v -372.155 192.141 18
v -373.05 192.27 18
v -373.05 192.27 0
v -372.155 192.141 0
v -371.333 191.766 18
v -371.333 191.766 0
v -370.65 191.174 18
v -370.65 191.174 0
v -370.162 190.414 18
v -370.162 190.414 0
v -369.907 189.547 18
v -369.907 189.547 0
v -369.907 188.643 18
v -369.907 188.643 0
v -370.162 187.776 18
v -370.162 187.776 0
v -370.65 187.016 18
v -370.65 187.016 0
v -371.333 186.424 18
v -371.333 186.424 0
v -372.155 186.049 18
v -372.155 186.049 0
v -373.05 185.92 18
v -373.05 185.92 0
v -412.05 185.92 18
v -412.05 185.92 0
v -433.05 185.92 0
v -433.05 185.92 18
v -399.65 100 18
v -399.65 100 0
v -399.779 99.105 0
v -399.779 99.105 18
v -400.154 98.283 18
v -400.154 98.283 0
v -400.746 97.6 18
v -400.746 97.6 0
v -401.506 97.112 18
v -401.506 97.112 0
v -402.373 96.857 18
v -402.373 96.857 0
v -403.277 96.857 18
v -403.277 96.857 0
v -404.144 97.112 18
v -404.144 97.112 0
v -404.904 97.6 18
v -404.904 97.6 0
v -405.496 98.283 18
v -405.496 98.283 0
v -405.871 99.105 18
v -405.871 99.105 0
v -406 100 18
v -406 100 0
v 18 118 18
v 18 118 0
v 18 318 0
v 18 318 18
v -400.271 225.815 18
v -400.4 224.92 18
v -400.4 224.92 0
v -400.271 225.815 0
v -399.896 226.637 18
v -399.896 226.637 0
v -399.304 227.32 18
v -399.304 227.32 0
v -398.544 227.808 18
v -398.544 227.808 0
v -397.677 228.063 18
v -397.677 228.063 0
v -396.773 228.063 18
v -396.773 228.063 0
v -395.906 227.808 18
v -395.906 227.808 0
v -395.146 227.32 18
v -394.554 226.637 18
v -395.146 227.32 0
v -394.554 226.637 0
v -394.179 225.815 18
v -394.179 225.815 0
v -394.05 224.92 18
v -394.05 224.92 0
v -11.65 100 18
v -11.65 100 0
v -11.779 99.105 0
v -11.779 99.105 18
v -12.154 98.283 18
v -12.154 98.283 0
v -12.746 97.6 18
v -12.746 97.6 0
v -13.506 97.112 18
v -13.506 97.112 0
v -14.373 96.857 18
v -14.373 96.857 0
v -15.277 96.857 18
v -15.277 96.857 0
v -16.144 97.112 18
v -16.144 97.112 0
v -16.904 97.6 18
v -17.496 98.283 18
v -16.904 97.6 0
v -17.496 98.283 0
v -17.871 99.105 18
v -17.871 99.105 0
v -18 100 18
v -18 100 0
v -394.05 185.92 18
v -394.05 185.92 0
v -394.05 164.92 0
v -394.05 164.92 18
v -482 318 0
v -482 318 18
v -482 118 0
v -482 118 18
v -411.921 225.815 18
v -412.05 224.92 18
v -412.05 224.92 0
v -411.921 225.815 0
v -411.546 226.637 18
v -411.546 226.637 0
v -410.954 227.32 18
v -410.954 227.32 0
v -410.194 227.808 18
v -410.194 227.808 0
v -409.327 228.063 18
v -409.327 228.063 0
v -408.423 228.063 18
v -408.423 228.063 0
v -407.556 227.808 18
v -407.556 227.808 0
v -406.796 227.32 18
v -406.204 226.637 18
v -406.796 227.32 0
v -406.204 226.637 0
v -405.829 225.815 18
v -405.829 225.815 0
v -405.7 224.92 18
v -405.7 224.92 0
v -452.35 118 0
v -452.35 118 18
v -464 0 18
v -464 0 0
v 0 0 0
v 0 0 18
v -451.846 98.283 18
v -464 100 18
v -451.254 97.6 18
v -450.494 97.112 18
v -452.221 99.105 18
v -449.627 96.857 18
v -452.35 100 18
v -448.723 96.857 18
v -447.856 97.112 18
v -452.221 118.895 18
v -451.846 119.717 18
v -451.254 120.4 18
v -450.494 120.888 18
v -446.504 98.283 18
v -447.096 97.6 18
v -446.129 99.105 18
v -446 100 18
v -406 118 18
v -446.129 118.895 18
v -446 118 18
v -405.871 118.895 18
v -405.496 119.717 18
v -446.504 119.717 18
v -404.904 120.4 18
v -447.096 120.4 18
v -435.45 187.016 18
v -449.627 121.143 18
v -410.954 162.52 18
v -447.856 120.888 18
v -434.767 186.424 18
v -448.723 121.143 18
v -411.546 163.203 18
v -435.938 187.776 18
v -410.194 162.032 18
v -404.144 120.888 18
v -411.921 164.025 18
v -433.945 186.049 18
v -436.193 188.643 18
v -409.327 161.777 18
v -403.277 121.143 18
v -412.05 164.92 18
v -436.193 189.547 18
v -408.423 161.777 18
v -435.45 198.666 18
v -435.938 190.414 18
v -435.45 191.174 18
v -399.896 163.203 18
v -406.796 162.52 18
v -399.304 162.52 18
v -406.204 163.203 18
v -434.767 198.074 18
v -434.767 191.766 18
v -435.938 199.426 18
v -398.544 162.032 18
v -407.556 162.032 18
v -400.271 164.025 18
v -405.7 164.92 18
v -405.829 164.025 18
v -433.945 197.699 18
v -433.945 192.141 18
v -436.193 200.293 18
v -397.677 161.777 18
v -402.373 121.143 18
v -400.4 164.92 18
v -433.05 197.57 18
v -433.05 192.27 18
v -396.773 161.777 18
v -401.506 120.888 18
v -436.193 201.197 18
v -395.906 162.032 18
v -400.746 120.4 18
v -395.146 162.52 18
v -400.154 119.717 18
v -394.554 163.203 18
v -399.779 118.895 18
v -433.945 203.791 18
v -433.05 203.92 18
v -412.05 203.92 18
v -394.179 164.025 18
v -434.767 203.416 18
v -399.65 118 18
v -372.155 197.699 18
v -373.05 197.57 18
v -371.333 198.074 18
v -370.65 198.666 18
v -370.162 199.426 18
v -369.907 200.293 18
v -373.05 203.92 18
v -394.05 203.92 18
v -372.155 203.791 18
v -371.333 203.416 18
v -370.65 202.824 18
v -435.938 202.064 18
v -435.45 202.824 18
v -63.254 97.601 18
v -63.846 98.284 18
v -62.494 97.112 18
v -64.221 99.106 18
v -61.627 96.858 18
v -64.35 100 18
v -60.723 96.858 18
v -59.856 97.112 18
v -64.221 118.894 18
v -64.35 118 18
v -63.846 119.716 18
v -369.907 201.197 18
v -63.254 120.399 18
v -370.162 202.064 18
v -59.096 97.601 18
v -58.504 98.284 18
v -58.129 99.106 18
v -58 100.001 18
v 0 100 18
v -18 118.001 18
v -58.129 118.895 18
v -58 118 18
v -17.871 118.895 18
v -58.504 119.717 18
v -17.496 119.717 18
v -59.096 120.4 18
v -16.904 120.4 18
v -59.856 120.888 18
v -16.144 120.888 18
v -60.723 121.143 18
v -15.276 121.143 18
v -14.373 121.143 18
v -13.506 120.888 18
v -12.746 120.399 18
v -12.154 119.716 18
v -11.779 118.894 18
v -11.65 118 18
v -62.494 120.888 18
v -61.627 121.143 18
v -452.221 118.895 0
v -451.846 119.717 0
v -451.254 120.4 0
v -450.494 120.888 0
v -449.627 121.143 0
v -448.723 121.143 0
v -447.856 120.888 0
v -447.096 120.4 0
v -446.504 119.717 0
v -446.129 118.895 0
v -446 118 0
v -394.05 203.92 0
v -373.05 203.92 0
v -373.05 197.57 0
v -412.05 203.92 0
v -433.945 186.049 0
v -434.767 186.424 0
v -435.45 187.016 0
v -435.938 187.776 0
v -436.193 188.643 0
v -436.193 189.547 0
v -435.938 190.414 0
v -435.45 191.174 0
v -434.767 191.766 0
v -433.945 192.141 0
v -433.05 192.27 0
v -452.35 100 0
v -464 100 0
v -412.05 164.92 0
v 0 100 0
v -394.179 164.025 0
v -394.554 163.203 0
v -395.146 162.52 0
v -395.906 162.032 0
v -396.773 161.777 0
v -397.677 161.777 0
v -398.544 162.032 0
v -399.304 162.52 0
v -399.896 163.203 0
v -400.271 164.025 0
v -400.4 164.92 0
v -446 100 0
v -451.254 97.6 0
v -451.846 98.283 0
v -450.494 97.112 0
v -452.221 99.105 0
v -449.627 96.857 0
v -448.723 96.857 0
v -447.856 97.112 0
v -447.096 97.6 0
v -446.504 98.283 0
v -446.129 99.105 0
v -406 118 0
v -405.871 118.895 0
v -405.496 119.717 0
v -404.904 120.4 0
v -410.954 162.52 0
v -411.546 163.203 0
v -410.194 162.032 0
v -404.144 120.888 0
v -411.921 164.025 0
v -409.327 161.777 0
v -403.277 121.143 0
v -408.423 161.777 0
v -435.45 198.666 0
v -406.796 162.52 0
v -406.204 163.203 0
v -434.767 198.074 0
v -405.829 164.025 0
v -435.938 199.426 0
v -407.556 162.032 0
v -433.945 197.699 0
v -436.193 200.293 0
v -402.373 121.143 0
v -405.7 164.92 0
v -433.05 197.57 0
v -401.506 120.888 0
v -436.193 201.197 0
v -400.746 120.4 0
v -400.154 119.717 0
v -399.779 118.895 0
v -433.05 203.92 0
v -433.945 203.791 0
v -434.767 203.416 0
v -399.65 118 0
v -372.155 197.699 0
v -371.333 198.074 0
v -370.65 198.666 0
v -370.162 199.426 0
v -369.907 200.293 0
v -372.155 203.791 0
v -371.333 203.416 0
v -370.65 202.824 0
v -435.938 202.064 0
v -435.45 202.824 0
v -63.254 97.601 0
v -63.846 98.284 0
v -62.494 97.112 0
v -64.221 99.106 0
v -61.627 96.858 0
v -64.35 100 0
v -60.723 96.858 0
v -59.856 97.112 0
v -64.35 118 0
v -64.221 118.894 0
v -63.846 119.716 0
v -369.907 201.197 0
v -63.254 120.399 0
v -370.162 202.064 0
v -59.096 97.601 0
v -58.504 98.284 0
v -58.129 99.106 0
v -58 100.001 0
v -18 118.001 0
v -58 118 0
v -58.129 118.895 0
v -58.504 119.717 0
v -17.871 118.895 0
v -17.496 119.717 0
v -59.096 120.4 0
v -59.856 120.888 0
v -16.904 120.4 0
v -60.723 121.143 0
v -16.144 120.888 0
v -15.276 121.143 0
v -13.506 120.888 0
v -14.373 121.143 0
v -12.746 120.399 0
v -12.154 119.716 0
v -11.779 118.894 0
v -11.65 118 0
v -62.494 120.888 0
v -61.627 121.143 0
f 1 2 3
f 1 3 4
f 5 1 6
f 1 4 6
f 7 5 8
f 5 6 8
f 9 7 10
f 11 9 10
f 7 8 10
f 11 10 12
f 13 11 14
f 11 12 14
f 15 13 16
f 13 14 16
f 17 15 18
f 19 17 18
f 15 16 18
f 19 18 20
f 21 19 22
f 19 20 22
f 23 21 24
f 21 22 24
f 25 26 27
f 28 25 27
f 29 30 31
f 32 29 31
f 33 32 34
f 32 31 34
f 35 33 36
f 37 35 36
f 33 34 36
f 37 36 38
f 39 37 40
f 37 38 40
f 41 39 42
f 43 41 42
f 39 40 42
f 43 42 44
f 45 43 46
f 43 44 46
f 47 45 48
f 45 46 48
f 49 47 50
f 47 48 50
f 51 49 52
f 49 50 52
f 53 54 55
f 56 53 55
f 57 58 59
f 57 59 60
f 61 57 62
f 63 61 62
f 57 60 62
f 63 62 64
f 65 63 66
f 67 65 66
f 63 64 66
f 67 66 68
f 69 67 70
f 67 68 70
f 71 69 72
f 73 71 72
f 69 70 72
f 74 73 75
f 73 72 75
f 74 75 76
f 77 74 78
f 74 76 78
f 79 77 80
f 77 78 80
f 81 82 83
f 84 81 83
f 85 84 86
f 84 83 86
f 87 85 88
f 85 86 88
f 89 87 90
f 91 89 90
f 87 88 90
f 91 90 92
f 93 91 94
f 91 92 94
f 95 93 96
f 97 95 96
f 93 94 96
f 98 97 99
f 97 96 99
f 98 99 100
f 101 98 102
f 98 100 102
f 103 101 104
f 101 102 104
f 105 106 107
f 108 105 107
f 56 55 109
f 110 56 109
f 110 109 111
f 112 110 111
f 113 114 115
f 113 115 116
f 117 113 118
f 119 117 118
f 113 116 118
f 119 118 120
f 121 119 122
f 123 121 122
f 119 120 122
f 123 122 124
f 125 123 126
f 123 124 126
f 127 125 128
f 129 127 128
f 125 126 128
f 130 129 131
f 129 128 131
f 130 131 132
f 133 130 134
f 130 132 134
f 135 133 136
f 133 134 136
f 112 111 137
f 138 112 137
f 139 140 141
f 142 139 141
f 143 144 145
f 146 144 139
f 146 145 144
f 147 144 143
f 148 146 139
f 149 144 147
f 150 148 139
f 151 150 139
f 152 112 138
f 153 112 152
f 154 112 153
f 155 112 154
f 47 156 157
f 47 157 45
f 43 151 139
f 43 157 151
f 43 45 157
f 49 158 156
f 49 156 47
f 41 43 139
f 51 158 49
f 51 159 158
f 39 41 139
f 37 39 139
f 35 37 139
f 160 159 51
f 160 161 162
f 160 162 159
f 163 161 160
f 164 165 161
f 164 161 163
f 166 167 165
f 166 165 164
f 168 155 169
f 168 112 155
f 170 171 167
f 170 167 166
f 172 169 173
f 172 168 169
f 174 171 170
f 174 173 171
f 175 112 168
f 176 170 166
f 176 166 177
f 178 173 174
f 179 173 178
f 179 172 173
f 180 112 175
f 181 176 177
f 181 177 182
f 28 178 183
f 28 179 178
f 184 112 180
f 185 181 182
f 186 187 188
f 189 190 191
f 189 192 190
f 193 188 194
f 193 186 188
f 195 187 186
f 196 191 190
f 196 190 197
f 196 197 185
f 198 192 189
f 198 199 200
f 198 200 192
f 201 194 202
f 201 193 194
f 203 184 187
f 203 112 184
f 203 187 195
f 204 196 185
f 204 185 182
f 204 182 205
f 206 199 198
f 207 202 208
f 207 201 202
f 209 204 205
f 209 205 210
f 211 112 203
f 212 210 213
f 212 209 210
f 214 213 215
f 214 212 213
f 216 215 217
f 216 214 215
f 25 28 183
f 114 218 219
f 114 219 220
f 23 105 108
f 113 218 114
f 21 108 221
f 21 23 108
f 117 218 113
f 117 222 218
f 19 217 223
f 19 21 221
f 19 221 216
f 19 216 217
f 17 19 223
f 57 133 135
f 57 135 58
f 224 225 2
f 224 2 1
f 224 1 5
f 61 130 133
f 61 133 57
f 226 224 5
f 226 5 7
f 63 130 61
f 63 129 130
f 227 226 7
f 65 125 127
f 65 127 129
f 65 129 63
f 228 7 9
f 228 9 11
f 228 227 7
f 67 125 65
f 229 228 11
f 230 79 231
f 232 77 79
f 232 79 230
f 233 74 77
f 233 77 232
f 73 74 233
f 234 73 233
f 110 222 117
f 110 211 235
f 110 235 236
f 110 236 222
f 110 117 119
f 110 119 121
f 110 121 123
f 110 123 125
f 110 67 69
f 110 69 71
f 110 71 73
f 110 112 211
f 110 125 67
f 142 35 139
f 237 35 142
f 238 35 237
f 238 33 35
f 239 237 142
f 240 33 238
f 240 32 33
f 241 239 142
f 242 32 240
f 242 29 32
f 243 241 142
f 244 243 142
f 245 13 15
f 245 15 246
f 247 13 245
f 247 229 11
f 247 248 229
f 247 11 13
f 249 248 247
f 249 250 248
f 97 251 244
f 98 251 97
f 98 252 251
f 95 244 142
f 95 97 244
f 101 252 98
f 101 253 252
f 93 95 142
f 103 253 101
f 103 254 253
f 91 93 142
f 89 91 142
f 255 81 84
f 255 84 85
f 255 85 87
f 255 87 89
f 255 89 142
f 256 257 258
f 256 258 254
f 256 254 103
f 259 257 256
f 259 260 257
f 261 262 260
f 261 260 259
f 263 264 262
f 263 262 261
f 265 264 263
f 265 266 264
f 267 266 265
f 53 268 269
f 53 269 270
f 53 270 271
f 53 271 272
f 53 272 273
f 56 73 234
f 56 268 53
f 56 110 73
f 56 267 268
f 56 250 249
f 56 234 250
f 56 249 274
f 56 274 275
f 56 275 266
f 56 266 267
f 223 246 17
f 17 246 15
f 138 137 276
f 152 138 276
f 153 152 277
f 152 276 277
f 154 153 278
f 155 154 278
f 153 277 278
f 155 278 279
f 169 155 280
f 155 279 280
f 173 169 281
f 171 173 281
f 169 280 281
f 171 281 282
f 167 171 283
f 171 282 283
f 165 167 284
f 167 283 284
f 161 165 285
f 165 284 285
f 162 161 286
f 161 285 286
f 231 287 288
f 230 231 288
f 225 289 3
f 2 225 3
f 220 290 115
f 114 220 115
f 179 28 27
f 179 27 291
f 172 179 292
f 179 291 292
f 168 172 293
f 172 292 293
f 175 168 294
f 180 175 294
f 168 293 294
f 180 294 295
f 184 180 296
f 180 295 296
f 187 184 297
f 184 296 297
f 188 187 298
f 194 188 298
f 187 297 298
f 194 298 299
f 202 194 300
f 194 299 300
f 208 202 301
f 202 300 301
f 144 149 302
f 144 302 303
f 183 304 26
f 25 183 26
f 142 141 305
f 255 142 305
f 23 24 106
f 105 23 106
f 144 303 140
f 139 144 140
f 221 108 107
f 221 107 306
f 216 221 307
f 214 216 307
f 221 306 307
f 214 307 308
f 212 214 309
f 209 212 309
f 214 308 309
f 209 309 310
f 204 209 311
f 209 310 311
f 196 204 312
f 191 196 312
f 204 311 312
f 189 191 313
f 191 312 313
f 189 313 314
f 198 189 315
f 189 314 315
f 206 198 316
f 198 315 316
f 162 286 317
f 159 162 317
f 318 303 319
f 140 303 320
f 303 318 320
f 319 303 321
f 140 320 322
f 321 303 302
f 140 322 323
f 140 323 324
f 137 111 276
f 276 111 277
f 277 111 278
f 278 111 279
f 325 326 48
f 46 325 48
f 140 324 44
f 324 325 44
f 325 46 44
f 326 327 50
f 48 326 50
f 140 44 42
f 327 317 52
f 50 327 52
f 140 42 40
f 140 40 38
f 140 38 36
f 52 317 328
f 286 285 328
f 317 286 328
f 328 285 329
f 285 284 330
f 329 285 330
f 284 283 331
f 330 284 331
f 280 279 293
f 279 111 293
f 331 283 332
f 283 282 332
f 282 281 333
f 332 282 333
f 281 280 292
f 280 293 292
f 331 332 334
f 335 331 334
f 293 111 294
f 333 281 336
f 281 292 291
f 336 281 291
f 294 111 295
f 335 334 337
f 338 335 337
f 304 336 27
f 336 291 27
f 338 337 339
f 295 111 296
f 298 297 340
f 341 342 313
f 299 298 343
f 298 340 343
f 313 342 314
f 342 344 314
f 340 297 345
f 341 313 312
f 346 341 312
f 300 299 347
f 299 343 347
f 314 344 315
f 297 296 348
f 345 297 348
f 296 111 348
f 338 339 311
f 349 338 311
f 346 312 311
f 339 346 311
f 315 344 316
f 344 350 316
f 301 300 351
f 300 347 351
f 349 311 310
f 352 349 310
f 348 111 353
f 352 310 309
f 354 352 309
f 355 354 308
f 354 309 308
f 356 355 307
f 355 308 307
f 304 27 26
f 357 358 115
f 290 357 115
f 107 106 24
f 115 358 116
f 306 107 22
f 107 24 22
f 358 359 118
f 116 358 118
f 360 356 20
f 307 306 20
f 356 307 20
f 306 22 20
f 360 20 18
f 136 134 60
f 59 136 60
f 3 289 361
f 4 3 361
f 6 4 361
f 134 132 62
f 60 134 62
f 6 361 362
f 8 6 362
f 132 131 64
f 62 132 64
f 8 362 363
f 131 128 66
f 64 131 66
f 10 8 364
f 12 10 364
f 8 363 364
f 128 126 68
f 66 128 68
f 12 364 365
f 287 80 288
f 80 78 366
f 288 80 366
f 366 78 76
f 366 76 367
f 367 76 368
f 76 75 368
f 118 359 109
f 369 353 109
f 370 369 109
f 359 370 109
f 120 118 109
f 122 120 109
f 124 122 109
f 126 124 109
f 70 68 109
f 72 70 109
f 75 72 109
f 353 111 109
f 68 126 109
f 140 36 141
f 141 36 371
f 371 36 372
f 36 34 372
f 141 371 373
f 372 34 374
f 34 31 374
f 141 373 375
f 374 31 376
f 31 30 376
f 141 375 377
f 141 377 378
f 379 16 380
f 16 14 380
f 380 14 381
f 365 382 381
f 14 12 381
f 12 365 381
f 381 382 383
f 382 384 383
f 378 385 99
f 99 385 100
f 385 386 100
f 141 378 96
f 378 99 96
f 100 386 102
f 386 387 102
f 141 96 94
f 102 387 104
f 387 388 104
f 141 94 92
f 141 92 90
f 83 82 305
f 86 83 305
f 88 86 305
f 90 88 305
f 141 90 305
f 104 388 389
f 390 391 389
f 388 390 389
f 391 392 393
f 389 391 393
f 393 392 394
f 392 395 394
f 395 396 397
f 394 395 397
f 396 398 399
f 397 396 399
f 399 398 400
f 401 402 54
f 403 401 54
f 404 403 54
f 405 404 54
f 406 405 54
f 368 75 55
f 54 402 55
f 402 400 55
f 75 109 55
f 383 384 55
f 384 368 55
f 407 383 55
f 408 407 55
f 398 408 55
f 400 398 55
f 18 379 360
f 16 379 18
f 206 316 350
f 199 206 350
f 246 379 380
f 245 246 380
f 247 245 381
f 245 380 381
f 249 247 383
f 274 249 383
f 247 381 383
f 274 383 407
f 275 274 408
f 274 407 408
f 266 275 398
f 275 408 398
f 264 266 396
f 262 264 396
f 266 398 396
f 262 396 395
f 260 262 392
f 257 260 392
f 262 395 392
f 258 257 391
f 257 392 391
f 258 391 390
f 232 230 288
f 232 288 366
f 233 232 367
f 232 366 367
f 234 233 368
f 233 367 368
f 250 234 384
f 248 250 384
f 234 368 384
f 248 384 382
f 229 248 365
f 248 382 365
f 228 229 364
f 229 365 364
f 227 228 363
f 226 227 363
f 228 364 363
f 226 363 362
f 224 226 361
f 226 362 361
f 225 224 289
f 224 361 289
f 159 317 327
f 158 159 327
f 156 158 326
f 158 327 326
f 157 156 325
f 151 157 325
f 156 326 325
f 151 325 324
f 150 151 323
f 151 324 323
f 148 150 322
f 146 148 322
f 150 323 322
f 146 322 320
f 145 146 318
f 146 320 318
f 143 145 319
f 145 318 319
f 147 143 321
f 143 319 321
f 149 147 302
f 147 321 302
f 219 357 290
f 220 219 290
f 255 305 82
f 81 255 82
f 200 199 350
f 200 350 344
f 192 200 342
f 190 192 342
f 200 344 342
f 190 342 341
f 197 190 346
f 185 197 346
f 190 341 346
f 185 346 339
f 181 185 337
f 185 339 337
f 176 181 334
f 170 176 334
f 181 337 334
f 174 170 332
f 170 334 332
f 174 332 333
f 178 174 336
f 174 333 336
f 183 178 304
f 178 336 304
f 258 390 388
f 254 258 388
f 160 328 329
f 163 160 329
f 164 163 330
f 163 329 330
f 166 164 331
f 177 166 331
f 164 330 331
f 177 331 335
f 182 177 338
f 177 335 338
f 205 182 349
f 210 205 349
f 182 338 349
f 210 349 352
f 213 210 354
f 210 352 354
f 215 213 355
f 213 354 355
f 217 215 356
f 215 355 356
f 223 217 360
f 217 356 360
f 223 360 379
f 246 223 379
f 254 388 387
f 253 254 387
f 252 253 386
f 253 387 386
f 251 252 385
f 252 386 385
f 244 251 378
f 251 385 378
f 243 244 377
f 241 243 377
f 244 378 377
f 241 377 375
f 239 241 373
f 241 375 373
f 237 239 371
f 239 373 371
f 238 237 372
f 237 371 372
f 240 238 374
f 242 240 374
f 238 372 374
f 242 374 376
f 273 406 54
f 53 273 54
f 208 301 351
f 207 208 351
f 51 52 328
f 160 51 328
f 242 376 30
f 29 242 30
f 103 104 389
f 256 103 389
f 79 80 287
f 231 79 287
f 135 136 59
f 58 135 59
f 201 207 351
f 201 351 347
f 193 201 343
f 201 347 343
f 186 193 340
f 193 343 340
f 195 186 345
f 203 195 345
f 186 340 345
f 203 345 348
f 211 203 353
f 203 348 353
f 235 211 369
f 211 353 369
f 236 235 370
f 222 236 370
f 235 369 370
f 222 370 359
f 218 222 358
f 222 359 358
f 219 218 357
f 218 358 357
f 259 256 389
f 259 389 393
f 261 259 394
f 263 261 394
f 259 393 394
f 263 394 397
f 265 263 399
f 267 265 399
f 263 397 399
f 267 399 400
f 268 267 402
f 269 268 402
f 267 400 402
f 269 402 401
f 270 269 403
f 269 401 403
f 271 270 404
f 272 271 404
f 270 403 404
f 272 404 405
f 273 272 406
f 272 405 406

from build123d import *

# Parameters (mm, degrees)
ESTRUSIONE_ESTRUSIONE1_DEPTH = 18
TAGLIO_ESTRUSIONE3_DEPTH     = 61
TAGLIO_ESTRUSIONE5_DEPTH     = 100


with BuildPart() as part:
    # Schizzo1 → Estrusione-Estrusione1 (new body)
    with BuildSketch(Plane.XY):
        with BuildLine():
            Line((-452.35, 100), (-464, 100))
            Line((-464, 100), (-464, 0))
            Line((-464, 0), (0, 0))
            Line((0, 0), (0, 100))
            Line((0, 100), (-11.650000002, 100))
            ThreePointArc((-11.650000002, 100), (-14.825000002, 96.825), (-18.000000001, 100))
            Line((-18.000000001, 100), (-18.000000001, 118.000682307))
            ThreePointArc((-18.000000001, 118.000682307), (-14.824658921, 121.174999982), (-11.650000075, 118))
            Line((-11.650000075, 118), (18, 118))
            Line((18, 118), (18, 318))
            Line((18, 318), (-482, 318))
            Line((-482, 318), (-482, 118))
            Line((-482, 118), (-452.35, 118))
            ThreePointArc((-452.35, 118), (-449.175, 121.175), (-446, 118))
            Line((-446, 118), (-446, 100))
            ThreePointArc((-446, 100), (-449.175, 96.825), (-452.35, 100))
        make_face()
    extrude(amount=ESTRUSIONE_ESTRUSIONE1_DEPTH)

    # Schizzo1<6> → Taglio-Estrusione3 (cut)
    with BuildSketch(Plane.XY):
        with BuildLine():
            Line((-399.65, 118), (-64.349999981, 118))
            ThreePointArc((-64.349999981, 118), (-61.175172814, 121.174999995), (-58, 118.000345666))
            Line((-58, 118.000345666), (-58, 100.000682304))
            ThreePointArc((-58, 100.000682304), (-61.174658811, 96.825341189), (-64.349999927, 100))
            Line((-64.349999927, 100), (-399.65, 100))
            ThreePointArc((-399.65, 100), (-402.825, 96.825), (-406, 100))
            Line((-406, 100), (-406, 118))
            ThreePointArc((-406, 118), (-402.825, 121.175), (-399.65, 118))
        make_face()
    extrude(amount=TAGLIO_ESTRUSIONE3_DEPTH, mode=Mode.SUBTRACT)

    # Schizzo1<8> → Taglio-Estrusione5 (cut)
    with BuildSketch(Plane.XY):
        with BuildLine():
            Line((-412.05, 185.92), (-433.05, 185.92))
            ThreePointArc((-433.05, 185.92), (-436.225, 189.095), (-433.05, 192.27))
            Line((-433.05, 192.27), (-433.05, 197.57))
            ThreePointArc((-433.05, 197.57), (-436.225, 200.745), (-433.05, 203.92))
            Line((-433.05, 203.92), (-412.05, 203.92))
            Line((-412.05, 203.92), (-412.05, 224.92))
            ThreePointArc((-412.05, 224.92), (-408.875, 228.095), (-405.7, 224.92))
            Line((-405.7, 224.92), (-400.4, 224.92))
            ThreePointArc((-400.4, 224.92), (-397.225, 228.095), (-394.05, 224.92))
            Line((-394.05, 224.92), (-394.05, 203.92))
            Line((-394.05, 203.92), (-373.05, 203.92))
            ThreePointArc((-373.05, 203.92), (-369.875, 200.745), (-373.05, 197.57))
            Line((-373.05, 197.57), (-373.05, 192.27))
            ThreePointArc((-373.05, 192.27), (-369.875, 189.095), (-373.05, 185.92))
            Line((-373.05, 185.92), (-394.05, 185.92))
            Line((-394.05, 185.92), (-394.05, 164.92))
            ThreePointArc((-394.05, 164.92), (-397.225, 161.745), (-400.4, 164.92))
            Line((-400.4, 164.92), (-405.7, 164.92))
            ThreePointArc((-405.7, 164.92), (-408.875, 161.745), (-412.05, 164.92))
            Line((-412.05, 164.92), (-412.05, 185.92))
        make_face()
    extrude(amount=TAGLIO_ESTRUSIONE5_DEPTH, mode=Mode.SUBTRACT)


solid = part.part
